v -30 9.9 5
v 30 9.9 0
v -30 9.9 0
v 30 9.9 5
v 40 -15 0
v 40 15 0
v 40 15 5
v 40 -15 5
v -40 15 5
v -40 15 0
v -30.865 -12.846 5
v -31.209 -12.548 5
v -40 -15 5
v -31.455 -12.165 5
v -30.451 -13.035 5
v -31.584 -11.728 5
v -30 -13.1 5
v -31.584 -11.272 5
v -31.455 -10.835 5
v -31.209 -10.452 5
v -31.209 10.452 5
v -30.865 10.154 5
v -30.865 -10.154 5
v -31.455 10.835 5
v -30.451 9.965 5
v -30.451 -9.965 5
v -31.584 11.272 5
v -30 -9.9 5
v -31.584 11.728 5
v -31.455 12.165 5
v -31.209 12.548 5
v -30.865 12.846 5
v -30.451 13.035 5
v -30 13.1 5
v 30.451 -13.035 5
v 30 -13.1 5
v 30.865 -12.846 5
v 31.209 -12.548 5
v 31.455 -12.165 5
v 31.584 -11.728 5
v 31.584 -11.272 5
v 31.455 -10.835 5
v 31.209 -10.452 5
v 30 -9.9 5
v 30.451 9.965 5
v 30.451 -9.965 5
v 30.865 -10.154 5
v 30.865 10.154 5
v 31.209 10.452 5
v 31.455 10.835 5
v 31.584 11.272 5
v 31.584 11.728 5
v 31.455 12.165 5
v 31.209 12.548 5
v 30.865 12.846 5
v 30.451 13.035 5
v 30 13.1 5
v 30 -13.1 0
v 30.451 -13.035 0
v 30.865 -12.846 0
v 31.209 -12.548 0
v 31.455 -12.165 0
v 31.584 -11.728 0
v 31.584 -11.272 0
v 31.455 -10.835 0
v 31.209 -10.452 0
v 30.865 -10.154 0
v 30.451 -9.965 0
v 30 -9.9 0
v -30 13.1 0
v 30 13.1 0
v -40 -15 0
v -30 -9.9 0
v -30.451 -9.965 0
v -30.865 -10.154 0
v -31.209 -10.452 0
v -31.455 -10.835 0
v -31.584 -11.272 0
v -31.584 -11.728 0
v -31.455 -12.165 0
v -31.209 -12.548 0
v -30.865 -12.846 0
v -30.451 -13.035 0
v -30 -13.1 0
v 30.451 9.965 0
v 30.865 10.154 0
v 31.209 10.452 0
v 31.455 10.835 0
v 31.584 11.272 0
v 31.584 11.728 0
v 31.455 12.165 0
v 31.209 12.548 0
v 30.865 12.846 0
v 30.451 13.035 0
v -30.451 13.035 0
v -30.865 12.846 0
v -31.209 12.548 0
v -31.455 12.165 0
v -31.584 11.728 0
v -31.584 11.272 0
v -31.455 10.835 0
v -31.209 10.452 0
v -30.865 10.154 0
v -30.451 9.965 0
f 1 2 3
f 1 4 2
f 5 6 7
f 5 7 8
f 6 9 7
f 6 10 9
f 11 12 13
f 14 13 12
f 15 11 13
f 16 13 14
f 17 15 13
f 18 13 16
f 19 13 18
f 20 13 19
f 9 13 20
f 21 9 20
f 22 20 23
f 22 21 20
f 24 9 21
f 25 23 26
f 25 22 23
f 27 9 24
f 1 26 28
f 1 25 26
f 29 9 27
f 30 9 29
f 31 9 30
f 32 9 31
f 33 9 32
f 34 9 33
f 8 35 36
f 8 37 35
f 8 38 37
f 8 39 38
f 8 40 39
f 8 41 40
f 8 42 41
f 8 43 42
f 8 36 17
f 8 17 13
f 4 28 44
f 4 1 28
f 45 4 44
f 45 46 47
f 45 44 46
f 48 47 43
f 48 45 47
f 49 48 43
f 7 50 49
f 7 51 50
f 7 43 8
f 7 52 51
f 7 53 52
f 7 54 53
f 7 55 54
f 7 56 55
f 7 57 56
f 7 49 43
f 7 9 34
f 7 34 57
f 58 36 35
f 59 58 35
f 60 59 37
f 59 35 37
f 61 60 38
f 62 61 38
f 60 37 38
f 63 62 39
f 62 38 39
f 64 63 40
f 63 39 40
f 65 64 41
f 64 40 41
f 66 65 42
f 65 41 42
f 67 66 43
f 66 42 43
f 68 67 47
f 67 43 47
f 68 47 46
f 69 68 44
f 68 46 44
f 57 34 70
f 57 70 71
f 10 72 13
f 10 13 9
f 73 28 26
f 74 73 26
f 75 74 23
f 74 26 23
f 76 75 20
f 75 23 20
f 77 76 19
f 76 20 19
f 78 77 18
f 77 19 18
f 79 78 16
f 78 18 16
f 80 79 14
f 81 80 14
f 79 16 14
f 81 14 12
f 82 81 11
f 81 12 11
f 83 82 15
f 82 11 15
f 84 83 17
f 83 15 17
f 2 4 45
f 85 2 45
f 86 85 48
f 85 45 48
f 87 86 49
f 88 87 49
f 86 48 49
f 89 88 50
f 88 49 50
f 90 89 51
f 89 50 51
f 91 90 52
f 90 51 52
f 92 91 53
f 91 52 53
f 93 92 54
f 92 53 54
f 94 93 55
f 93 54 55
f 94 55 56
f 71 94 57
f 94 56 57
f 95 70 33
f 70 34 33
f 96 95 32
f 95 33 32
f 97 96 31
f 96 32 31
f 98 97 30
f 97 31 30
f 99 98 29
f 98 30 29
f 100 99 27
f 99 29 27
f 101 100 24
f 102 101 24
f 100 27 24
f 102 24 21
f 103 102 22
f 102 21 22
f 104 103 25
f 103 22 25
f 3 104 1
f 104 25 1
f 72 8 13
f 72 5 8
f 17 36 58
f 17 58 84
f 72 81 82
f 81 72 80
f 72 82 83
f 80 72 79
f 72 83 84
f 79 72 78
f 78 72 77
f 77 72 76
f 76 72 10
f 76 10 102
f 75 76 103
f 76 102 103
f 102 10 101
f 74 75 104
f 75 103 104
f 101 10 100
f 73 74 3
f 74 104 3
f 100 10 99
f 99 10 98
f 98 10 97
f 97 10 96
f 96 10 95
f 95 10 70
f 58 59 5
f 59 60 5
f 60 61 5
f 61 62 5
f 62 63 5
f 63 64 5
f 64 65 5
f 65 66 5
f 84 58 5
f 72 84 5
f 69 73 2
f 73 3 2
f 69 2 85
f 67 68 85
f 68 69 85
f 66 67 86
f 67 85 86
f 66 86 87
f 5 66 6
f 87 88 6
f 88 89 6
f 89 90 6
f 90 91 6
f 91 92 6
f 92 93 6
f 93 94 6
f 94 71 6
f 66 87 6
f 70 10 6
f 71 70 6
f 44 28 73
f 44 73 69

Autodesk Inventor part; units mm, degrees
ref_plane "YZ Plane" through (0, 0, 0) normal (1, 0, 0) x (0, 1, 0)
ref_plane "XZ Plane" through (0, 0, 0) normal (0, 1, 0) x (-1, 0, 0)
ref_plane "XY Plane" through (0, 0, 0) normal (0, 0, 1) x (1, 0, 0)
sketch "スケッチ1" plane through (0, 0, 0) normal (0, 0, 1) x (1, 0, 0)
  line L0 (-40, 15) -> (40, 15)
  line L1 (40, 15) -> (40, -15)
  line L2 (40, -15) -> (-40, -15)
  line L3 (-40, -15) -> (-40, 15)
  point P0 (0, 0)
  dimension "d0" = 80
  dimension "d1" = 40
  dimension "d2" = 30
  dimension "d3" = 15
extrude "押し出し1" add sketch "スケッチ1" along normal blind 5
sketch "スケッチ2" plane through (0, 0, 5) normal (0, 0, 1) x (1, 0, 0)
  line L0 (40, 15) -> (40, -15) projected
  line L1 (-40, 15) -> (40, 15) projected
  line L2 (-40, -15) -> (-40, 15) projected
  line L3 (40, -15) -> (-40, -15) projected
  line L4 (-30, 13.1) -> (30, 13.1)
  line L5 (30, 13.1) -> (30, 9.9)
  line L6 (30, 9.9) -> (-30, 9.9)
  line L7 (-30, 9.9) -> (-30, 13.1)
  line L8 (-30, -9.9) -> (30, -9.9)
  line L9 (30, -9.9) -> (30, -13.1)
  line L10 (30, -13.1) -> (-30, -13.1)
  line L11 (-30, -13.1) -> (-30, -9.9)
  circle A0 centre (-30, 11.5) radius 1.6
  circle A1 centre (30, 11.5) radius 1.6
  circle A2 centre (-30, -11.5) radius 1.6
  circle A3 centre (30, -11.5) radius 1.6
  point P0 (0, 0)
  dimension "d6" = 5.1
  dimension "d7" = 3.2
  dimension "d8" = 5.1
  dimension "d9" = 3.2
  dimension "d10" = 10
  dimension "d11" = 10
  dimension "d12" = 10
  dimension "d13" = 10
extrude "押し出し2" cut sketch "スケッチ2" against normal through all contours A0 L7 | L4 A1 L6 A0 | L7 A0 | A1 L5 | L5 A1 | A2 L11 | L8 A3 L10 A2 | L11 A2 | A3 L9 | L9 A3
equation "\"d1\" = 0.5 * d0"
equation "\"d3\" = 0.5 * d2"
equation "\"d8\" = d6"
equation "\"d9\" = d7"
equation "\"d11\" = d10"
equation "\"d12\" = d10"
equation "\"d13\" = d10"
properties part number "JointA3"
